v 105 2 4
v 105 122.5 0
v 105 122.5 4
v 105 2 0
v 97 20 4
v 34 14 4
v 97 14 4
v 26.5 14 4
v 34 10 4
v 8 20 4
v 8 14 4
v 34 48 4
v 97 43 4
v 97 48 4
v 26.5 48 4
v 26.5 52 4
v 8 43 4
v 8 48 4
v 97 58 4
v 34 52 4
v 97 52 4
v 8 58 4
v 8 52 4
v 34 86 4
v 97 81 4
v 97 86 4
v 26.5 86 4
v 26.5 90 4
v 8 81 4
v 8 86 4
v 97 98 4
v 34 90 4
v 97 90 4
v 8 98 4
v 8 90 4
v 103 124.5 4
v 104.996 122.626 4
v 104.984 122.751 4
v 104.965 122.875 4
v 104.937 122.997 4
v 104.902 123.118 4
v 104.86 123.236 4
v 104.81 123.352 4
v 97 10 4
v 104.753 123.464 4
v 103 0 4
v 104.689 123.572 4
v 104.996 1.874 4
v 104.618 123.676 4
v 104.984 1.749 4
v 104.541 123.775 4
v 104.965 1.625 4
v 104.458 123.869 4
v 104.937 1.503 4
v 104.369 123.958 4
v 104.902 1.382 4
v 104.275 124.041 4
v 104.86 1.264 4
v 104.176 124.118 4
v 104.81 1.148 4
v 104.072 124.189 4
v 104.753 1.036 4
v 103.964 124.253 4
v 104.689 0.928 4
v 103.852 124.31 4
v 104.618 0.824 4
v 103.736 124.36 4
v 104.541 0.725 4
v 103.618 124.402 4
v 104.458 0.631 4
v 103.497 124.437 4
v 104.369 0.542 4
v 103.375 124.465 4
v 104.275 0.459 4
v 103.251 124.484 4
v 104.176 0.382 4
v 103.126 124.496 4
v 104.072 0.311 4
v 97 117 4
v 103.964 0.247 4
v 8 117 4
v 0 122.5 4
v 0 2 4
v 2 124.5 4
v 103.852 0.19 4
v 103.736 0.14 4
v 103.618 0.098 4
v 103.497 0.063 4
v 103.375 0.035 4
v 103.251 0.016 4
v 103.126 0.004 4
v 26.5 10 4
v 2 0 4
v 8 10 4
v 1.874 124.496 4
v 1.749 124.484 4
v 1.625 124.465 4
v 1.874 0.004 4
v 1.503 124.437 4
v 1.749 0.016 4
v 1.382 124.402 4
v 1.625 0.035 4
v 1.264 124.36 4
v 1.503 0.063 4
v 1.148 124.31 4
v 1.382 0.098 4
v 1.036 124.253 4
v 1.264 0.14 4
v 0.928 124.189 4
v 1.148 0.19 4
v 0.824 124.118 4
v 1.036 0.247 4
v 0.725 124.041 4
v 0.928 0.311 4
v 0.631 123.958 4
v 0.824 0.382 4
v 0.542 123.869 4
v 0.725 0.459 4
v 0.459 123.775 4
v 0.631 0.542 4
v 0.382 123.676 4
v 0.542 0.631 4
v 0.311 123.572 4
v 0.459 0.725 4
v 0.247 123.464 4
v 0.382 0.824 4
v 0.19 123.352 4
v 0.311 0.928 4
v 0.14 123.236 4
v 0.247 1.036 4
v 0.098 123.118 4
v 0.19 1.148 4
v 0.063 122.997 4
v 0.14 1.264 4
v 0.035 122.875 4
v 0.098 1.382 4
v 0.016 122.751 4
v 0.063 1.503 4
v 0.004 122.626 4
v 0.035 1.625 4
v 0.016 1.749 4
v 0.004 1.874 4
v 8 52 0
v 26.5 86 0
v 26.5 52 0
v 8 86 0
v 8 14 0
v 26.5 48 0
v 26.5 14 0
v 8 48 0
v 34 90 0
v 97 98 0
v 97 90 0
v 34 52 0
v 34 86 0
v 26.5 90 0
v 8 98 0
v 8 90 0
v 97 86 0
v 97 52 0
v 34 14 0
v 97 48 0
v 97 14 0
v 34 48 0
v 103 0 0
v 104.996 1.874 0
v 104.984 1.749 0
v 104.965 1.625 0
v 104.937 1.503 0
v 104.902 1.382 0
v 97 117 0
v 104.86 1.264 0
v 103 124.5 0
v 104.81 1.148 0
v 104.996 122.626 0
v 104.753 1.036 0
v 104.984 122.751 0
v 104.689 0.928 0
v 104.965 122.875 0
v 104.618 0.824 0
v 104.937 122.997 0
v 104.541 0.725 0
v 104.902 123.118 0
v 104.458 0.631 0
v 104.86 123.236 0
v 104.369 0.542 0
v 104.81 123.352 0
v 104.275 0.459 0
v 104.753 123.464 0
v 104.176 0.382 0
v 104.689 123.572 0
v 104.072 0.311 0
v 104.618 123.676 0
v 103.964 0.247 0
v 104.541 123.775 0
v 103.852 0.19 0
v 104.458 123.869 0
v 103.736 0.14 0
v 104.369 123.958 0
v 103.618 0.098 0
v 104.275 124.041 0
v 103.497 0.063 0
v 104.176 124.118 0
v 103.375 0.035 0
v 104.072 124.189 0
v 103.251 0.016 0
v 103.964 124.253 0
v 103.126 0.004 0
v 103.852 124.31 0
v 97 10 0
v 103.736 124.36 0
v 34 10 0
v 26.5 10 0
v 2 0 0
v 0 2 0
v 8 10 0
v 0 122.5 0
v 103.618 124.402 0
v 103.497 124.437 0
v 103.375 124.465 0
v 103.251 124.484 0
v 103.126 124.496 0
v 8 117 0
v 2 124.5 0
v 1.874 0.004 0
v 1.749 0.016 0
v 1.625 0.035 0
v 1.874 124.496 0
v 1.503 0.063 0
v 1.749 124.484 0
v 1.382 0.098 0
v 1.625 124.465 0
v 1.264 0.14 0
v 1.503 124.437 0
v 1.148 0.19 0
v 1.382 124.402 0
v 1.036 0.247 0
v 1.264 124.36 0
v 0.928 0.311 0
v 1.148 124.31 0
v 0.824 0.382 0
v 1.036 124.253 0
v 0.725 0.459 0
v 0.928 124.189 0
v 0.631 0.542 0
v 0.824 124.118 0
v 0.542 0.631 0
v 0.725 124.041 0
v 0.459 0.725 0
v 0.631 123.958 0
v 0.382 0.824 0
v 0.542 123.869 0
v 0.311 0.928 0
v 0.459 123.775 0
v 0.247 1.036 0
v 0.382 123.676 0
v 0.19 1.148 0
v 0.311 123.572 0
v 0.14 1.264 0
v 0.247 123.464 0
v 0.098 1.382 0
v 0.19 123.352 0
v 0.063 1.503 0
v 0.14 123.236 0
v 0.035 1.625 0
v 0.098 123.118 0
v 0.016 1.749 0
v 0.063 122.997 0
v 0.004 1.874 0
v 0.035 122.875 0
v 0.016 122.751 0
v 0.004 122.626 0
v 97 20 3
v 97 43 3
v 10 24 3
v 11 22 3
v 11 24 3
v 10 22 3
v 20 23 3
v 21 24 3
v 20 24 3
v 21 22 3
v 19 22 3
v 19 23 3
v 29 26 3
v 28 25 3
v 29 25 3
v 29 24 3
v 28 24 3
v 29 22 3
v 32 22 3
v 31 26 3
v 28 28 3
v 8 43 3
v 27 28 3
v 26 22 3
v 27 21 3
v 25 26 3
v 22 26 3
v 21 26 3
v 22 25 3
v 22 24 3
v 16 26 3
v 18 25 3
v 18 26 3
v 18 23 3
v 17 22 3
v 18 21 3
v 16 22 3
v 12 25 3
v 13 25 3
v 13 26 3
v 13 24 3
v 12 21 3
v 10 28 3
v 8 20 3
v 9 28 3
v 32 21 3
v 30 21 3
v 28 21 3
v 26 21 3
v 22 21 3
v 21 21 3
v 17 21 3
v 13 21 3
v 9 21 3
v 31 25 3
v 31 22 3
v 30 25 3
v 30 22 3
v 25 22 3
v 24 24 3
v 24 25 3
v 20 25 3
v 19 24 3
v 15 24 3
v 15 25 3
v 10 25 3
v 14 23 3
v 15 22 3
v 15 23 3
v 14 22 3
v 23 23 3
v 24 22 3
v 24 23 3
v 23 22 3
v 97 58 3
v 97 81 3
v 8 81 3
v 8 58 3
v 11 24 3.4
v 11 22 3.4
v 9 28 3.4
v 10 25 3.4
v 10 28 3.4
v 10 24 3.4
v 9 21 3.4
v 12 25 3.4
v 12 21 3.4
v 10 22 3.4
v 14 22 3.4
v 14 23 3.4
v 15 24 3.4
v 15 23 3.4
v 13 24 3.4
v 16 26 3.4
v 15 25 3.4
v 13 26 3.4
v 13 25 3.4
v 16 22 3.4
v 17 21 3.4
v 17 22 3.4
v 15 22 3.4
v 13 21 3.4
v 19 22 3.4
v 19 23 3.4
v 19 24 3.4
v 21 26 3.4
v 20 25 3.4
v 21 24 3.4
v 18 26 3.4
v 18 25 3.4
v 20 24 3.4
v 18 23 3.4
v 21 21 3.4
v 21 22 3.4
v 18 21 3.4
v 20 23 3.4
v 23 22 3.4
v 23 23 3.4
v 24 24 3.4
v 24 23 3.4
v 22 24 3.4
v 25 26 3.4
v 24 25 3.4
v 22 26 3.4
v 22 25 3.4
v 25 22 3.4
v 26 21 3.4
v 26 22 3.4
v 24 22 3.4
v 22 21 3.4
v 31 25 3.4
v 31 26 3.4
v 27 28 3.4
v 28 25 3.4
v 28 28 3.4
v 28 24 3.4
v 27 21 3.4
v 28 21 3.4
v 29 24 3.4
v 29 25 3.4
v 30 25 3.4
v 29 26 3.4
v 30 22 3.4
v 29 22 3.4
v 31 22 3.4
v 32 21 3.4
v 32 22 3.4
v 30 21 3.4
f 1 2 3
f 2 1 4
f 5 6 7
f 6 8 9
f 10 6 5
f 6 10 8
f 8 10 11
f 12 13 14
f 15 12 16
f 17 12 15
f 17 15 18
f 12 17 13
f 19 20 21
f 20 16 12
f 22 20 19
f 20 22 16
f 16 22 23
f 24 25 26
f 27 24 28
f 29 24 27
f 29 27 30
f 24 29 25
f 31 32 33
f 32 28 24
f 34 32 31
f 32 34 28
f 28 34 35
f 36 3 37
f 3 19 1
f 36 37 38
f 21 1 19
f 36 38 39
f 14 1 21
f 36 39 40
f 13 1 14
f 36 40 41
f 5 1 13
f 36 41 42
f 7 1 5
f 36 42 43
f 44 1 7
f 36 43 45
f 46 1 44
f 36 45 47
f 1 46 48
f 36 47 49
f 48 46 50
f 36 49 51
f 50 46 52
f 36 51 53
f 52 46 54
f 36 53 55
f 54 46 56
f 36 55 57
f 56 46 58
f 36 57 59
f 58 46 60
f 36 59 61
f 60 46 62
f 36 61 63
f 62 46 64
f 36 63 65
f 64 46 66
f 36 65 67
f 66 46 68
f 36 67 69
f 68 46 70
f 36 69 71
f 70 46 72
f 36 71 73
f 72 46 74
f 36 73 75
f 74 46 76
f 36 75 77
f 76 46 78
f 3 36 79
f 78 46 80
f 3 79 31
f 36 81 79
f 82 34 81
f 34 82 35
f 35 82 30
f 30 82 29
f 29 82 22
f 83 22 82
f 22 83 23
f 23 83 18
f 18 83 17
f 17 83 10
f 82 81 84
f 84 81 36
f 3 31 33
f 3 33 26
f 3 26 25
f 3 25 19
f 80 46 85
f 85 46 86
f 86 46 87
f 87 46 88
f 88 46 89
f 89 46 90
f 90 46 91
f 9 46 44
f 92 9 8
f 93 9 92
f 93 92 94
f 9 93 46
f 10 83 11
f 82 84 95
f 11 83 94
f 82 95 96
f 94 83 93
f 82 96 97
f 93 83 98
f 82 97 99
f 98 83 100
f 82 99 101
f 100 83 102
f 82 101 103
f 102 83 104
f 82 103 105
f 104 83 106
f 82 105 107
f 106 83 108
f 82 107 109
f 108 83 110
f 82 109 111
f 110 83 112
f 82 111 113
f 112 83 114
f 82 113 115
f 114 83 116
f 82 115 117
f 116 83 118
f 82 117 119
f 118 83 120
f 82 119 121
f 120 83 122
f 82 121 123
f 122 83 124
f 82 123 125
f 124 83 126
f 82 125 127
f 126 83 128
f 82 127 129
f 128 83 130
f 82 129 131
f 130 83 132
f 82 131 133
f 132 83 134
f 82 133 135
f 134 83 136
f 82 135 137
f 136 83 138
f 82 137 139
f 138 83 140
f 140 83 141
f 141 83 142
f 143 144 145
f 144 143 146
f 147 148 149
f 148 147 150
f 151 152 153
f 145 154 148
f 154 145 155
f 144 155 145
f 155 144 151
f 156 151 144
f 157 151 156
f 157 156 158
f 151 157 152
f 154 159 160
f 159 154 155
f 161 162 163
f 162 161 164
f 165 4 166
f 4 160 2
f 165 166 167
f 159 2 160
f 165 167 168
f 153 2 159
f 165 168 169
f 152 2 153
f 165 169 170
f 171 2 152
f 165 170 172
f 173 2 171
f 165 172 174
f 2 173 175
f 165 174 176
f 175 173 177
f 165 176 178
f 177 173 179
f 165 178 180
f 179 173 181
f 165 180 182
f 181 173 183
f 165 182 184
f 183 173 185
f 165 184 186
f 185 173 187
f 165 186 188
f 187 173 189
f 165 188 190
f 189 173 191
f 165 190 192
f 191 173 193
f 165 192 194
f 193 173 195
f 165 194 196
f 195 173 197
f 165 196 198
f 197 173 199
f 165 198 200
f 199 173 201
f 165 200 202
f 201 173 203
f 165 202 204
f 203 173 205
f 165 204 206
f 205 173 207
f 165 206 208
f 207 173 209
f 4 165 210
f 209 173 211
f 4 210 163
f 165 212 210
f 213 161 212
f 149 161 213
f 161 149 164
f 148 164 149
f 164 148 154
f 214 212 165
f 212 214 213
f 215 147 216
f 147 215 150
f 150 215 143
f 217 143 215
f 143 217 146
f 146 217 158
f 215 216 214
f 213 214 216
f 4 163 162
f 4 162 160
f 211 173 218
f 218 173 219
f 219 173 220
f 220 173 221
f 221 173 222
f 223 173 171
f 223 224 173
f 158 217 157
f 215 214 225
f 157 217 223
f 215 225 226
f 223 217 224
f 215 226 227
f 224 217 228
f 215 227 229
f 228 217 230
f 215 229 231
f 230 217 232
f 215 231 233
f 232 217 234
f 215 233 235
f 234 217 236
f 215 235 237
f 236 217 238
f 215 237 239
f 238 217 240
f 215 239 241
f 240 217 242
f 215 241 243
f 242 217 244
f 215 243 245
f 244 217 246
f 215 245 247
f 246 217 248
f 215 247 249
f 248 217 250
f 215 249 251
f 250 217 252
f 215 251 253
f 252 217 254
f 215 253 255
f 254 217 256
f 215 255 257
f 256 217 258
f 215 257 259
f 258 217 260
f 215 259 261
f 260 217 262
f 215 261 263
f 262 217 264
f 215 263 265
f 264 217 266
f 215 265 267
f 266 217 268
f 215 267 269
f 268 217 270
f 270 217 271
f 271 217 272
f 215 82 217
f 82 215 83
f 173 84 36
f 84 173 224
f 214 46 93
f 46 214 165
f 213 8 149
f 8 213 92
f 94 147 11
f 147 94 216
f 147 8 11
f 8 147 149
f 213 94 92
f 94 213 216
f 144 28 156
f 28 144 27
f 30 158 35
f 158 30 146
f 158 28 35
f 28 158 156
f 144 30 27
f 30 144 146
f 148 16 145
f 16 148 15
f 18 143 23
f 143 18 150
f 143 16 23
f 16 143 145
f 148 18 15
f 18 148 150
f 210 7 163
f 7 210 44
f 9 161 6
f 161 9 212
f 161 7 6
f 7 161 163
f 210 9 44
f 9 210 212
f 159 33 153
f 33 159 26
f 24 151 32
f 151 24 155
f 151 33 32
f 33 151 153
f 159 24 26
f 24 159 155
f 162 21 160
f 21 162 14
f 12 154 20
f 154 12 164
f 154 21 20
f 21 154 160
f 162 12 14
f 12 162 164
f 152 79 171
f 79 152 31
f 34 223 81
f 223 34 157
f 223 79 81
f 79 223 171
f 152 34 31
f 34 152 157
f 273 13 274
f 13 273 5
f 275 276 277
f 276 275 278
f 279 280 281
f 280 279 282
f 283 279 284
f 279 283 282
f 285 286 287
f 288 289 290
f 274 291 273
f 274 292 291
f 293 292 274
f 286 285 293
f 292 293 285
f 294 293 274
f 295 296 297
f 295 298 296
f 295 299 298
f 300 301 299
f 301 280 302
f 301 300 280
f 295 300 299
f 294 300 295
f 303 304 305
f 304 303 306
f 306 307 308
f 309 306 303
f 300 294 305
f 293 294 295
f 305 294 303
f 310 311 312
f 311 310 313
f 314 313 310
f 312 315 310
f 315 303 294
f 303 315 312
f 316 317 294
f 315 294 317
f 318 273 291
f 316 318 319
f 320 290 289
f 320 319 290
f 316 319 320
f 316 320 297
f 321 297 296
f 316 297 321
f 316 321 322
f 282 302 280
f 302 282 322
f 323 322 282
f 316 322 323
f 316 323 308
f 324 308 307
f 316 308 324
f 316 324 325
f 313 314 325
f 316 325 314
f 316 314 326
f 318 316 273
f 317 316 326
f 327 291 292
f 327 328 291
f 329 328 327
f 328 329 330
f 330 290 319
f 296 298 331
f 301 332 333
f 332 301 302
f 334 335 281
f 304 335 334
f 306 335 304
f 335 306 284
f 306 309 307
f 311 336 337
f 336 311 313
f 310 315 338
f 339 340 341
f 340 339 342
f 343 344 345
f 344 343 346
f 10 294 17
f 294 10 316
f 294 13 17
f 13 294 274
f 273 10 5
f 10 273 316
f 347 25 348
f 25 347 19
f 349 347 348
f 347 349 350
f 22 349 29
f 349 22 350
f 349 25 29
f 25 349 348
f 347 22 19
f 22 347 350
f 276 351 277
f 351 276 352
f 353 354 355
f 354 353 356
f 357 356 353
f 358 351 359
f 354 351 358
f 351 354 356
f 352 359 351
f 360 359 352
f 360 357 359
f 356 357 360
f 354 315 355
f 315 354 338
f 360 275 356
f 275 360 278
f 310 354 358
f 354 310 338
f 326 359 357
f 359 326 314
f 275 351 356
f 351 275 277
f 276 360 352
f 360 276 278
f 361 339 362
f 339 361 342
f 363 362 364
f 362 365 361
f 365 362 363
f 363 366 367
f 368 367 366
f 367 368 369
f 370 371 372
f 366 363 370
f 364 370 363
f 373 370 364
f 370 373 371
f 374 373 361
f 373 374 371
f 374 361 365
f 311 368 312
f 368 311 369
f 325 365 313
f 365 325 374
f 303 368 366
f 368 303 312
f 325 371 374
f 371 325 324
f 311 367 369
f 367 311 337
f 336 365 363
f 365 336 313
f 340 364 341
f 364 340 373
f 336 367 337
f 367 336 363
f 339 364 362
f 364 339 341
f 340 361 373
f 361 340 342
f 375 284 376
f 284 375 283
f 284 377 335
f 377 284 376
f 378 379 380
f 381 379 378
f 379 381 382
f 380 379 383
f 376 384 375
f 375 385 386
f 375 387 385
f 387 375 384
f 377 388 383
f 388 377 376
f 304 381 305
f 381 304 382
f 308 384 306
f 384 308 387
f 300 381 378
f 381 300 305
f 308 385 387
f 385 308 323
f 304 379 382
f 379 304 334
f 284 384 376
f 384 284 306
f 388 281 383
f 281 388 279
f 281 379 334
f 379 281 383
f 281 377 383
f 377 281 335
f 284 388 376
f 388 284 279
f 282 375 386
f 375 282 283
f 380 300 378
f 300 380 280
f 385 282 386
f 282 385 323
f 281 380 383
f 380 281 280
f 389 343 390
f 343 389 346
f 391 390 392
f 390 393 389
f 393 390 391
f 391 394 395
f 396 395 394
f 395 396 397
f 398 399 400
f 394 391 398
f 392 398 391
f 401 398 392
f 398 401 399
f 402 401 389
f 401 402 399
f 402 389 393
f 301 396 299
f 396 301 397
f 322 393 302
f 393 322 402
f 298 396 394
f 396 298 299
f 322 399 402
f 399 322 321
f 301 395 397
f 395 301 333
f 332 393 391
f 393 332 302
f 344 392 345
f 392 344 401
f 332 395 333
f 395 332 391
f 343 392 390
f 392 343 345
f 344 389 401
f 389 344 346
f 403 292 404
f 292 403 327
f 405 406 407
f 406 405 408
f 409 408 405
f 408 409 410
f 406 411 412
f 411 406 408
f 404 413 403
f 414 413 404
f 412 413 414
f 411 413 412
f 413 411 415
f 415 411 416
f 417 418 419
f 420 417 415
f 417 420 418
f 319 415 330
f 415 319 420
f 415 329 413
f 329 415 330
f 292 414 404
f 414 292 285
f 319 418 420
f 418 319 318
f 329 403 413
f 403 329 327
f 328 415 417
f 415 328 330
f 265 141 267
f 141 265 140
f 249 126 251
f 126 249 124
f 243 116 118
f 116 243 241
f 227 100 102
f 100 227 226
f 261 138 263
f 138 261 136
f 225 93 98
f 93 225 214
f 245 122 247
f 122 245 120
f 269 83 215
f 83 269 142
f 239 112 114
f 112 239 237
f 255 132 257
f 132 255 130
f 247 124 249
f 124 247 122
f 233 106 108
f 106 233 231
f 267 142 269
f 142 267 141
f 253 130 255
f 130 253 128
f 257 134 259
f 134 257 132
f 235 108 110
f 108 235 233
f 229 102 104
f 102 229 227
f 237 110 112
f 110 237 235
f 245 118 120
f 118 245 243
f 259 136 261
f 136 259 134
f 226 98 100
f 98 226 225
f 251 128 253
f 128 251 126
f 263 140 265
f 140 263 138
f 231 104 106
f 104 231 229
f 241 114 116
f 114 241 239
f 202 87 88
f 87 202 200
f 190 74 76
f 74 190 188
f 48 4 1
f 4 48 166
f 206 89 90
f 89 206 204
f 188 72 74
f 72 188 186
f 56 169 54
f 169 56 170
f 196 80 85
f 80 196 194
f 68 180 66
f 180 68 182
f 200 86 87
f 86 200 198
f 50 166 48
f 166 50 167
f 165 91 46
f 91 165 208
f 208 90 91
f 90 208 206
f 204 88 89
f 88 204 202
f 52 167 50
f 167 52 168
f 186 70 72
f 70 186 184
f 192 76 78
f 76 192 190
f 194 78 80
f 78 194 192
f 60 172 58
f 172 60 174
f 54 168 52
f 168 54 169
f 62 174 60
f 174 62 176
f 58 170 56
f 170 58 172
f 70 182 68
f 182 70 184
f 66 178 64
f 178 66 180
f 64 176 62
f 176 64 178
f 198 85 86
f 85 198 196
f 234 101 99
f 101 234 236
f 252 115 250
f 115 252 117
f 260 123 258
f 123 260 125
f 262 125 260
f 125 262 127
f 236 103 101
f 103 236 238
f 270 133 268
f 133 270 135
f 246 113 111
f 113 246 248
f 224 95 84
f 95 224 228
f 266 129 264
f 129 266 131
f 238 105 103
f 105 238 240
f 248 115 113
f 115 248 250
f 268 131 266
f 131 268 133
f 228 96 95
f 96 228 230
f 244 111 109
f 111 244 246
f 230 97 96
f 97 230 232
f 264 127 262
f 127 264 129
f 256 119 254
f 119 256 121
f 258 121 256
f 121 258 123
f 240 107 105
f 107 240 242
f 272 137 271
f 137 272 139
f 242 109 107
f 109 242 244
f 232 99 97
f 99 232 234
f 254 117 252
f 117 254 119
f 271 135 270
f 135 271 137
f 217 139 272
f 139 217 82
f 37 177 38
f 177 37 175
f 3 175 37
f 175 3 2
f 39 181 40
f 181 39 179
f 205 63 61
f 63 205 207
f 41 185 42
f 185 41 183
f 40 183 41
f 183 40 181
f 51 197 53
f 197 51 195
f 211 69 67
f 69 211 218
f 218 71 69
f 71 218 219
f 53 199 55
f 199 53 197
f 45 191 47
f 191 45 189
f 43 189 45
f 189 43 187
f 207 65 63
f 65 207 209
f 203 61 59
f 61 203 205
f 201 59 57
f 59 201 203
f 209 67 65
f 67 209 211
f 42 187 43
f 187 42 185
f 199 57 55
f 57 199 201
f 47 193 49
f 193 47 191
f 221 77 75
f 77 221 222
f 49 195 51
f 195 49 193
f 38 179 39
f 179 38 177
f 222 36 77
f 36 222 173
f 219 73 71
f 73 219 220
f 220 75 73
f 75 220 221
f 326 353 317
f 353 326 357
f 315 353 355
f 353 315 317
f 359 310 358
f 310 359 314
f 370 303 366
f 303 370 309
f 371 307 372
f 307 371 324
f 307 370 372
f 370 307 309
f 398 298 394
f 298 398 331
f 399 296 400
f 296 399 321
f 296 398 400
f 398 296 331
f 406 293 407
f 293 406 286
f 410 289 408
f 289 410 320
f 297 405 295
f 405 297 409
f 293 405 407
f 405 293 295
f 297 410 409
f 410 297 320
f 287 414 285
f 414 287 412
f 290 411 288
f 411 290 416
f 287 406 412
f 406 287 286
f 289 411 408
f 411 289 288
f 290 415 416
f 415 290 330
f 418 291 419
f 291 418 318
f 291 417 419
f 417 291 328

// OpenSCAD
$fn=100; //TO warto dodać na poczatku zawsze im większa liczba tym więcej wierzchołków w figurach więc są bardizej wygładzone, ale dłuzej renderuje
// stałe
a = 37; //szerokość

c = 4; //wysokość


s = 9;//pozycja sygnatury
y = 21;
g = 3;
r = 1;//rozmiar
gr = 0.4;//grubość


difference () {
cube([3*a-6,124.5,c]);
    translate([0,0,0])
    cube([2,2,c]);
    translate([3*a-6-2,0,0])
    cube([2,2,c]);
    translate([0,124.5-2,0])
    cube([2,2,c]);
    translate([3*a-6-2,124.5-2,0])
    cube([2,2,c]);
    translate([8,10,0])
    cube([18.5,4,4]);
    translate([8,86,0])
    cube([18.5,4,4]);
    translate([8,48,0])
    cube([18.5,4,4]);
    translate([34,10,0])
    cube([71-8,4,4]);
    translate([34,86,0])
    cube([71-8,4,4]);
    translate([34,48,0])
    cube([71-8,4,4]);
    
    translate([8,98,0])
    cube([3*a-6-8-8,19,4]);
    
    translate([8,20,3])
    cube([3*a-6-8-8,23,1]);
    translate([8,58,3])
    cube([3*a-6-8-8,23,1]);
}
//zaokrąglenia
translate([2,2,0])
cylinder(d=4,h=4);
translate([3*a-6-2,2,0])
cylinder(d=4,h=4);
translate([2,124.5-2,0])
cylinder(d=4,h=4);
translate([3*a-6-2,124.5-2,0])
cylinder(d=4,h=4);


//sygnatura
translate([s,y,g])
cube([1*r,7*r,gr]);
difference(){translate([s+1*r,y,g])
cube([1*r,4*r,gr]);
    translate([s+1*r,y+1*r,g])
    cube([1*r,2*r,gr]);
}
translate([s+2*r,y,g])//b
cube([1*r,4*r,gr]);
difference(){translate([s+4*r,y,g])//a
cube([1*r,5*r,gr]);
    translate([s+4*r,y+3*r,g])
    cube([1*r,1*r,gr]);
    
    }
difference(){translate([s+5*r,y,g])
cube([1*r,5*r,gr]);
    translate([s+5*r,y+1*r,g])
    cube([1*r,1*r,gr]);
    translate([s+5*r,y+3*r,g])
    cube([1*r,1*r,gr]);}
    
translate([s+6*r,y,g])
cube([1*r,5*r,gr]);
translate([s+7*r,y,g])
cube([1*r,1*r,gr]);


difference(){translate([s+9*r,y,g])//z
cube([1*r,5*r,gr]);
translate([s+9*r,y+2*r,g])
    cube([1*r,2*r,gr]);
}
difference(){translate([s+10*r,y,g])
cube([1*r,5*r,gr]);
    translate([s+10*r,y+3*r,g])
    cube([1*r,1*r,gr]);
    translate([s+10*r,y+1*r,g])
    cube([1*r,1*r,gr]);
    }
difference(){translate([s+11*r,y,g])
cube([1*r,5*r,gr]);
    translate([s+11*r,y+1*r,g])
    cube([1*r,2*r,gr]);
    }
    //
difference(){translate([s+13*r,y,g])//a
cube([1*r,5*r,gr]);
    translate([s+13*r,y+3*r,g])
    cube([1*r,1*r,gr]);
    
    }
difference(){translate([s+14*r,y,g])
cube([1*r,5*r,gr]);
    translate([s+14*r,y+1*r,g])
    cube([1*r,1*r,gr]);
    translate([s+14*r,y+3*r,g])
    cube([1*r,1*r,gr]);}
translate([s+15*r,y,g])
cube([1*r,5*r,gr]);
translate([s+16*r,y,g])
cube([1*r,1*r,gr]);
translate([s+18*r,y,g])//k
cube([1*r,7*r,gr]);
translate([s+19*r,y+3*r,g])
cube([1*r,1*r,gr]);
translate([s+20*r,y+1*r,g])
cube([1*r,4*r,gr]);
difference(){translate([s+21*r,y,g])
cube([1*r,5*r,gr]);
translate([s+21*r,y+1*r,g])
cube([1*r,3*r,gr]);}
translate([s+22*r,y,g])
cube([1*r,1*r,gr]);
